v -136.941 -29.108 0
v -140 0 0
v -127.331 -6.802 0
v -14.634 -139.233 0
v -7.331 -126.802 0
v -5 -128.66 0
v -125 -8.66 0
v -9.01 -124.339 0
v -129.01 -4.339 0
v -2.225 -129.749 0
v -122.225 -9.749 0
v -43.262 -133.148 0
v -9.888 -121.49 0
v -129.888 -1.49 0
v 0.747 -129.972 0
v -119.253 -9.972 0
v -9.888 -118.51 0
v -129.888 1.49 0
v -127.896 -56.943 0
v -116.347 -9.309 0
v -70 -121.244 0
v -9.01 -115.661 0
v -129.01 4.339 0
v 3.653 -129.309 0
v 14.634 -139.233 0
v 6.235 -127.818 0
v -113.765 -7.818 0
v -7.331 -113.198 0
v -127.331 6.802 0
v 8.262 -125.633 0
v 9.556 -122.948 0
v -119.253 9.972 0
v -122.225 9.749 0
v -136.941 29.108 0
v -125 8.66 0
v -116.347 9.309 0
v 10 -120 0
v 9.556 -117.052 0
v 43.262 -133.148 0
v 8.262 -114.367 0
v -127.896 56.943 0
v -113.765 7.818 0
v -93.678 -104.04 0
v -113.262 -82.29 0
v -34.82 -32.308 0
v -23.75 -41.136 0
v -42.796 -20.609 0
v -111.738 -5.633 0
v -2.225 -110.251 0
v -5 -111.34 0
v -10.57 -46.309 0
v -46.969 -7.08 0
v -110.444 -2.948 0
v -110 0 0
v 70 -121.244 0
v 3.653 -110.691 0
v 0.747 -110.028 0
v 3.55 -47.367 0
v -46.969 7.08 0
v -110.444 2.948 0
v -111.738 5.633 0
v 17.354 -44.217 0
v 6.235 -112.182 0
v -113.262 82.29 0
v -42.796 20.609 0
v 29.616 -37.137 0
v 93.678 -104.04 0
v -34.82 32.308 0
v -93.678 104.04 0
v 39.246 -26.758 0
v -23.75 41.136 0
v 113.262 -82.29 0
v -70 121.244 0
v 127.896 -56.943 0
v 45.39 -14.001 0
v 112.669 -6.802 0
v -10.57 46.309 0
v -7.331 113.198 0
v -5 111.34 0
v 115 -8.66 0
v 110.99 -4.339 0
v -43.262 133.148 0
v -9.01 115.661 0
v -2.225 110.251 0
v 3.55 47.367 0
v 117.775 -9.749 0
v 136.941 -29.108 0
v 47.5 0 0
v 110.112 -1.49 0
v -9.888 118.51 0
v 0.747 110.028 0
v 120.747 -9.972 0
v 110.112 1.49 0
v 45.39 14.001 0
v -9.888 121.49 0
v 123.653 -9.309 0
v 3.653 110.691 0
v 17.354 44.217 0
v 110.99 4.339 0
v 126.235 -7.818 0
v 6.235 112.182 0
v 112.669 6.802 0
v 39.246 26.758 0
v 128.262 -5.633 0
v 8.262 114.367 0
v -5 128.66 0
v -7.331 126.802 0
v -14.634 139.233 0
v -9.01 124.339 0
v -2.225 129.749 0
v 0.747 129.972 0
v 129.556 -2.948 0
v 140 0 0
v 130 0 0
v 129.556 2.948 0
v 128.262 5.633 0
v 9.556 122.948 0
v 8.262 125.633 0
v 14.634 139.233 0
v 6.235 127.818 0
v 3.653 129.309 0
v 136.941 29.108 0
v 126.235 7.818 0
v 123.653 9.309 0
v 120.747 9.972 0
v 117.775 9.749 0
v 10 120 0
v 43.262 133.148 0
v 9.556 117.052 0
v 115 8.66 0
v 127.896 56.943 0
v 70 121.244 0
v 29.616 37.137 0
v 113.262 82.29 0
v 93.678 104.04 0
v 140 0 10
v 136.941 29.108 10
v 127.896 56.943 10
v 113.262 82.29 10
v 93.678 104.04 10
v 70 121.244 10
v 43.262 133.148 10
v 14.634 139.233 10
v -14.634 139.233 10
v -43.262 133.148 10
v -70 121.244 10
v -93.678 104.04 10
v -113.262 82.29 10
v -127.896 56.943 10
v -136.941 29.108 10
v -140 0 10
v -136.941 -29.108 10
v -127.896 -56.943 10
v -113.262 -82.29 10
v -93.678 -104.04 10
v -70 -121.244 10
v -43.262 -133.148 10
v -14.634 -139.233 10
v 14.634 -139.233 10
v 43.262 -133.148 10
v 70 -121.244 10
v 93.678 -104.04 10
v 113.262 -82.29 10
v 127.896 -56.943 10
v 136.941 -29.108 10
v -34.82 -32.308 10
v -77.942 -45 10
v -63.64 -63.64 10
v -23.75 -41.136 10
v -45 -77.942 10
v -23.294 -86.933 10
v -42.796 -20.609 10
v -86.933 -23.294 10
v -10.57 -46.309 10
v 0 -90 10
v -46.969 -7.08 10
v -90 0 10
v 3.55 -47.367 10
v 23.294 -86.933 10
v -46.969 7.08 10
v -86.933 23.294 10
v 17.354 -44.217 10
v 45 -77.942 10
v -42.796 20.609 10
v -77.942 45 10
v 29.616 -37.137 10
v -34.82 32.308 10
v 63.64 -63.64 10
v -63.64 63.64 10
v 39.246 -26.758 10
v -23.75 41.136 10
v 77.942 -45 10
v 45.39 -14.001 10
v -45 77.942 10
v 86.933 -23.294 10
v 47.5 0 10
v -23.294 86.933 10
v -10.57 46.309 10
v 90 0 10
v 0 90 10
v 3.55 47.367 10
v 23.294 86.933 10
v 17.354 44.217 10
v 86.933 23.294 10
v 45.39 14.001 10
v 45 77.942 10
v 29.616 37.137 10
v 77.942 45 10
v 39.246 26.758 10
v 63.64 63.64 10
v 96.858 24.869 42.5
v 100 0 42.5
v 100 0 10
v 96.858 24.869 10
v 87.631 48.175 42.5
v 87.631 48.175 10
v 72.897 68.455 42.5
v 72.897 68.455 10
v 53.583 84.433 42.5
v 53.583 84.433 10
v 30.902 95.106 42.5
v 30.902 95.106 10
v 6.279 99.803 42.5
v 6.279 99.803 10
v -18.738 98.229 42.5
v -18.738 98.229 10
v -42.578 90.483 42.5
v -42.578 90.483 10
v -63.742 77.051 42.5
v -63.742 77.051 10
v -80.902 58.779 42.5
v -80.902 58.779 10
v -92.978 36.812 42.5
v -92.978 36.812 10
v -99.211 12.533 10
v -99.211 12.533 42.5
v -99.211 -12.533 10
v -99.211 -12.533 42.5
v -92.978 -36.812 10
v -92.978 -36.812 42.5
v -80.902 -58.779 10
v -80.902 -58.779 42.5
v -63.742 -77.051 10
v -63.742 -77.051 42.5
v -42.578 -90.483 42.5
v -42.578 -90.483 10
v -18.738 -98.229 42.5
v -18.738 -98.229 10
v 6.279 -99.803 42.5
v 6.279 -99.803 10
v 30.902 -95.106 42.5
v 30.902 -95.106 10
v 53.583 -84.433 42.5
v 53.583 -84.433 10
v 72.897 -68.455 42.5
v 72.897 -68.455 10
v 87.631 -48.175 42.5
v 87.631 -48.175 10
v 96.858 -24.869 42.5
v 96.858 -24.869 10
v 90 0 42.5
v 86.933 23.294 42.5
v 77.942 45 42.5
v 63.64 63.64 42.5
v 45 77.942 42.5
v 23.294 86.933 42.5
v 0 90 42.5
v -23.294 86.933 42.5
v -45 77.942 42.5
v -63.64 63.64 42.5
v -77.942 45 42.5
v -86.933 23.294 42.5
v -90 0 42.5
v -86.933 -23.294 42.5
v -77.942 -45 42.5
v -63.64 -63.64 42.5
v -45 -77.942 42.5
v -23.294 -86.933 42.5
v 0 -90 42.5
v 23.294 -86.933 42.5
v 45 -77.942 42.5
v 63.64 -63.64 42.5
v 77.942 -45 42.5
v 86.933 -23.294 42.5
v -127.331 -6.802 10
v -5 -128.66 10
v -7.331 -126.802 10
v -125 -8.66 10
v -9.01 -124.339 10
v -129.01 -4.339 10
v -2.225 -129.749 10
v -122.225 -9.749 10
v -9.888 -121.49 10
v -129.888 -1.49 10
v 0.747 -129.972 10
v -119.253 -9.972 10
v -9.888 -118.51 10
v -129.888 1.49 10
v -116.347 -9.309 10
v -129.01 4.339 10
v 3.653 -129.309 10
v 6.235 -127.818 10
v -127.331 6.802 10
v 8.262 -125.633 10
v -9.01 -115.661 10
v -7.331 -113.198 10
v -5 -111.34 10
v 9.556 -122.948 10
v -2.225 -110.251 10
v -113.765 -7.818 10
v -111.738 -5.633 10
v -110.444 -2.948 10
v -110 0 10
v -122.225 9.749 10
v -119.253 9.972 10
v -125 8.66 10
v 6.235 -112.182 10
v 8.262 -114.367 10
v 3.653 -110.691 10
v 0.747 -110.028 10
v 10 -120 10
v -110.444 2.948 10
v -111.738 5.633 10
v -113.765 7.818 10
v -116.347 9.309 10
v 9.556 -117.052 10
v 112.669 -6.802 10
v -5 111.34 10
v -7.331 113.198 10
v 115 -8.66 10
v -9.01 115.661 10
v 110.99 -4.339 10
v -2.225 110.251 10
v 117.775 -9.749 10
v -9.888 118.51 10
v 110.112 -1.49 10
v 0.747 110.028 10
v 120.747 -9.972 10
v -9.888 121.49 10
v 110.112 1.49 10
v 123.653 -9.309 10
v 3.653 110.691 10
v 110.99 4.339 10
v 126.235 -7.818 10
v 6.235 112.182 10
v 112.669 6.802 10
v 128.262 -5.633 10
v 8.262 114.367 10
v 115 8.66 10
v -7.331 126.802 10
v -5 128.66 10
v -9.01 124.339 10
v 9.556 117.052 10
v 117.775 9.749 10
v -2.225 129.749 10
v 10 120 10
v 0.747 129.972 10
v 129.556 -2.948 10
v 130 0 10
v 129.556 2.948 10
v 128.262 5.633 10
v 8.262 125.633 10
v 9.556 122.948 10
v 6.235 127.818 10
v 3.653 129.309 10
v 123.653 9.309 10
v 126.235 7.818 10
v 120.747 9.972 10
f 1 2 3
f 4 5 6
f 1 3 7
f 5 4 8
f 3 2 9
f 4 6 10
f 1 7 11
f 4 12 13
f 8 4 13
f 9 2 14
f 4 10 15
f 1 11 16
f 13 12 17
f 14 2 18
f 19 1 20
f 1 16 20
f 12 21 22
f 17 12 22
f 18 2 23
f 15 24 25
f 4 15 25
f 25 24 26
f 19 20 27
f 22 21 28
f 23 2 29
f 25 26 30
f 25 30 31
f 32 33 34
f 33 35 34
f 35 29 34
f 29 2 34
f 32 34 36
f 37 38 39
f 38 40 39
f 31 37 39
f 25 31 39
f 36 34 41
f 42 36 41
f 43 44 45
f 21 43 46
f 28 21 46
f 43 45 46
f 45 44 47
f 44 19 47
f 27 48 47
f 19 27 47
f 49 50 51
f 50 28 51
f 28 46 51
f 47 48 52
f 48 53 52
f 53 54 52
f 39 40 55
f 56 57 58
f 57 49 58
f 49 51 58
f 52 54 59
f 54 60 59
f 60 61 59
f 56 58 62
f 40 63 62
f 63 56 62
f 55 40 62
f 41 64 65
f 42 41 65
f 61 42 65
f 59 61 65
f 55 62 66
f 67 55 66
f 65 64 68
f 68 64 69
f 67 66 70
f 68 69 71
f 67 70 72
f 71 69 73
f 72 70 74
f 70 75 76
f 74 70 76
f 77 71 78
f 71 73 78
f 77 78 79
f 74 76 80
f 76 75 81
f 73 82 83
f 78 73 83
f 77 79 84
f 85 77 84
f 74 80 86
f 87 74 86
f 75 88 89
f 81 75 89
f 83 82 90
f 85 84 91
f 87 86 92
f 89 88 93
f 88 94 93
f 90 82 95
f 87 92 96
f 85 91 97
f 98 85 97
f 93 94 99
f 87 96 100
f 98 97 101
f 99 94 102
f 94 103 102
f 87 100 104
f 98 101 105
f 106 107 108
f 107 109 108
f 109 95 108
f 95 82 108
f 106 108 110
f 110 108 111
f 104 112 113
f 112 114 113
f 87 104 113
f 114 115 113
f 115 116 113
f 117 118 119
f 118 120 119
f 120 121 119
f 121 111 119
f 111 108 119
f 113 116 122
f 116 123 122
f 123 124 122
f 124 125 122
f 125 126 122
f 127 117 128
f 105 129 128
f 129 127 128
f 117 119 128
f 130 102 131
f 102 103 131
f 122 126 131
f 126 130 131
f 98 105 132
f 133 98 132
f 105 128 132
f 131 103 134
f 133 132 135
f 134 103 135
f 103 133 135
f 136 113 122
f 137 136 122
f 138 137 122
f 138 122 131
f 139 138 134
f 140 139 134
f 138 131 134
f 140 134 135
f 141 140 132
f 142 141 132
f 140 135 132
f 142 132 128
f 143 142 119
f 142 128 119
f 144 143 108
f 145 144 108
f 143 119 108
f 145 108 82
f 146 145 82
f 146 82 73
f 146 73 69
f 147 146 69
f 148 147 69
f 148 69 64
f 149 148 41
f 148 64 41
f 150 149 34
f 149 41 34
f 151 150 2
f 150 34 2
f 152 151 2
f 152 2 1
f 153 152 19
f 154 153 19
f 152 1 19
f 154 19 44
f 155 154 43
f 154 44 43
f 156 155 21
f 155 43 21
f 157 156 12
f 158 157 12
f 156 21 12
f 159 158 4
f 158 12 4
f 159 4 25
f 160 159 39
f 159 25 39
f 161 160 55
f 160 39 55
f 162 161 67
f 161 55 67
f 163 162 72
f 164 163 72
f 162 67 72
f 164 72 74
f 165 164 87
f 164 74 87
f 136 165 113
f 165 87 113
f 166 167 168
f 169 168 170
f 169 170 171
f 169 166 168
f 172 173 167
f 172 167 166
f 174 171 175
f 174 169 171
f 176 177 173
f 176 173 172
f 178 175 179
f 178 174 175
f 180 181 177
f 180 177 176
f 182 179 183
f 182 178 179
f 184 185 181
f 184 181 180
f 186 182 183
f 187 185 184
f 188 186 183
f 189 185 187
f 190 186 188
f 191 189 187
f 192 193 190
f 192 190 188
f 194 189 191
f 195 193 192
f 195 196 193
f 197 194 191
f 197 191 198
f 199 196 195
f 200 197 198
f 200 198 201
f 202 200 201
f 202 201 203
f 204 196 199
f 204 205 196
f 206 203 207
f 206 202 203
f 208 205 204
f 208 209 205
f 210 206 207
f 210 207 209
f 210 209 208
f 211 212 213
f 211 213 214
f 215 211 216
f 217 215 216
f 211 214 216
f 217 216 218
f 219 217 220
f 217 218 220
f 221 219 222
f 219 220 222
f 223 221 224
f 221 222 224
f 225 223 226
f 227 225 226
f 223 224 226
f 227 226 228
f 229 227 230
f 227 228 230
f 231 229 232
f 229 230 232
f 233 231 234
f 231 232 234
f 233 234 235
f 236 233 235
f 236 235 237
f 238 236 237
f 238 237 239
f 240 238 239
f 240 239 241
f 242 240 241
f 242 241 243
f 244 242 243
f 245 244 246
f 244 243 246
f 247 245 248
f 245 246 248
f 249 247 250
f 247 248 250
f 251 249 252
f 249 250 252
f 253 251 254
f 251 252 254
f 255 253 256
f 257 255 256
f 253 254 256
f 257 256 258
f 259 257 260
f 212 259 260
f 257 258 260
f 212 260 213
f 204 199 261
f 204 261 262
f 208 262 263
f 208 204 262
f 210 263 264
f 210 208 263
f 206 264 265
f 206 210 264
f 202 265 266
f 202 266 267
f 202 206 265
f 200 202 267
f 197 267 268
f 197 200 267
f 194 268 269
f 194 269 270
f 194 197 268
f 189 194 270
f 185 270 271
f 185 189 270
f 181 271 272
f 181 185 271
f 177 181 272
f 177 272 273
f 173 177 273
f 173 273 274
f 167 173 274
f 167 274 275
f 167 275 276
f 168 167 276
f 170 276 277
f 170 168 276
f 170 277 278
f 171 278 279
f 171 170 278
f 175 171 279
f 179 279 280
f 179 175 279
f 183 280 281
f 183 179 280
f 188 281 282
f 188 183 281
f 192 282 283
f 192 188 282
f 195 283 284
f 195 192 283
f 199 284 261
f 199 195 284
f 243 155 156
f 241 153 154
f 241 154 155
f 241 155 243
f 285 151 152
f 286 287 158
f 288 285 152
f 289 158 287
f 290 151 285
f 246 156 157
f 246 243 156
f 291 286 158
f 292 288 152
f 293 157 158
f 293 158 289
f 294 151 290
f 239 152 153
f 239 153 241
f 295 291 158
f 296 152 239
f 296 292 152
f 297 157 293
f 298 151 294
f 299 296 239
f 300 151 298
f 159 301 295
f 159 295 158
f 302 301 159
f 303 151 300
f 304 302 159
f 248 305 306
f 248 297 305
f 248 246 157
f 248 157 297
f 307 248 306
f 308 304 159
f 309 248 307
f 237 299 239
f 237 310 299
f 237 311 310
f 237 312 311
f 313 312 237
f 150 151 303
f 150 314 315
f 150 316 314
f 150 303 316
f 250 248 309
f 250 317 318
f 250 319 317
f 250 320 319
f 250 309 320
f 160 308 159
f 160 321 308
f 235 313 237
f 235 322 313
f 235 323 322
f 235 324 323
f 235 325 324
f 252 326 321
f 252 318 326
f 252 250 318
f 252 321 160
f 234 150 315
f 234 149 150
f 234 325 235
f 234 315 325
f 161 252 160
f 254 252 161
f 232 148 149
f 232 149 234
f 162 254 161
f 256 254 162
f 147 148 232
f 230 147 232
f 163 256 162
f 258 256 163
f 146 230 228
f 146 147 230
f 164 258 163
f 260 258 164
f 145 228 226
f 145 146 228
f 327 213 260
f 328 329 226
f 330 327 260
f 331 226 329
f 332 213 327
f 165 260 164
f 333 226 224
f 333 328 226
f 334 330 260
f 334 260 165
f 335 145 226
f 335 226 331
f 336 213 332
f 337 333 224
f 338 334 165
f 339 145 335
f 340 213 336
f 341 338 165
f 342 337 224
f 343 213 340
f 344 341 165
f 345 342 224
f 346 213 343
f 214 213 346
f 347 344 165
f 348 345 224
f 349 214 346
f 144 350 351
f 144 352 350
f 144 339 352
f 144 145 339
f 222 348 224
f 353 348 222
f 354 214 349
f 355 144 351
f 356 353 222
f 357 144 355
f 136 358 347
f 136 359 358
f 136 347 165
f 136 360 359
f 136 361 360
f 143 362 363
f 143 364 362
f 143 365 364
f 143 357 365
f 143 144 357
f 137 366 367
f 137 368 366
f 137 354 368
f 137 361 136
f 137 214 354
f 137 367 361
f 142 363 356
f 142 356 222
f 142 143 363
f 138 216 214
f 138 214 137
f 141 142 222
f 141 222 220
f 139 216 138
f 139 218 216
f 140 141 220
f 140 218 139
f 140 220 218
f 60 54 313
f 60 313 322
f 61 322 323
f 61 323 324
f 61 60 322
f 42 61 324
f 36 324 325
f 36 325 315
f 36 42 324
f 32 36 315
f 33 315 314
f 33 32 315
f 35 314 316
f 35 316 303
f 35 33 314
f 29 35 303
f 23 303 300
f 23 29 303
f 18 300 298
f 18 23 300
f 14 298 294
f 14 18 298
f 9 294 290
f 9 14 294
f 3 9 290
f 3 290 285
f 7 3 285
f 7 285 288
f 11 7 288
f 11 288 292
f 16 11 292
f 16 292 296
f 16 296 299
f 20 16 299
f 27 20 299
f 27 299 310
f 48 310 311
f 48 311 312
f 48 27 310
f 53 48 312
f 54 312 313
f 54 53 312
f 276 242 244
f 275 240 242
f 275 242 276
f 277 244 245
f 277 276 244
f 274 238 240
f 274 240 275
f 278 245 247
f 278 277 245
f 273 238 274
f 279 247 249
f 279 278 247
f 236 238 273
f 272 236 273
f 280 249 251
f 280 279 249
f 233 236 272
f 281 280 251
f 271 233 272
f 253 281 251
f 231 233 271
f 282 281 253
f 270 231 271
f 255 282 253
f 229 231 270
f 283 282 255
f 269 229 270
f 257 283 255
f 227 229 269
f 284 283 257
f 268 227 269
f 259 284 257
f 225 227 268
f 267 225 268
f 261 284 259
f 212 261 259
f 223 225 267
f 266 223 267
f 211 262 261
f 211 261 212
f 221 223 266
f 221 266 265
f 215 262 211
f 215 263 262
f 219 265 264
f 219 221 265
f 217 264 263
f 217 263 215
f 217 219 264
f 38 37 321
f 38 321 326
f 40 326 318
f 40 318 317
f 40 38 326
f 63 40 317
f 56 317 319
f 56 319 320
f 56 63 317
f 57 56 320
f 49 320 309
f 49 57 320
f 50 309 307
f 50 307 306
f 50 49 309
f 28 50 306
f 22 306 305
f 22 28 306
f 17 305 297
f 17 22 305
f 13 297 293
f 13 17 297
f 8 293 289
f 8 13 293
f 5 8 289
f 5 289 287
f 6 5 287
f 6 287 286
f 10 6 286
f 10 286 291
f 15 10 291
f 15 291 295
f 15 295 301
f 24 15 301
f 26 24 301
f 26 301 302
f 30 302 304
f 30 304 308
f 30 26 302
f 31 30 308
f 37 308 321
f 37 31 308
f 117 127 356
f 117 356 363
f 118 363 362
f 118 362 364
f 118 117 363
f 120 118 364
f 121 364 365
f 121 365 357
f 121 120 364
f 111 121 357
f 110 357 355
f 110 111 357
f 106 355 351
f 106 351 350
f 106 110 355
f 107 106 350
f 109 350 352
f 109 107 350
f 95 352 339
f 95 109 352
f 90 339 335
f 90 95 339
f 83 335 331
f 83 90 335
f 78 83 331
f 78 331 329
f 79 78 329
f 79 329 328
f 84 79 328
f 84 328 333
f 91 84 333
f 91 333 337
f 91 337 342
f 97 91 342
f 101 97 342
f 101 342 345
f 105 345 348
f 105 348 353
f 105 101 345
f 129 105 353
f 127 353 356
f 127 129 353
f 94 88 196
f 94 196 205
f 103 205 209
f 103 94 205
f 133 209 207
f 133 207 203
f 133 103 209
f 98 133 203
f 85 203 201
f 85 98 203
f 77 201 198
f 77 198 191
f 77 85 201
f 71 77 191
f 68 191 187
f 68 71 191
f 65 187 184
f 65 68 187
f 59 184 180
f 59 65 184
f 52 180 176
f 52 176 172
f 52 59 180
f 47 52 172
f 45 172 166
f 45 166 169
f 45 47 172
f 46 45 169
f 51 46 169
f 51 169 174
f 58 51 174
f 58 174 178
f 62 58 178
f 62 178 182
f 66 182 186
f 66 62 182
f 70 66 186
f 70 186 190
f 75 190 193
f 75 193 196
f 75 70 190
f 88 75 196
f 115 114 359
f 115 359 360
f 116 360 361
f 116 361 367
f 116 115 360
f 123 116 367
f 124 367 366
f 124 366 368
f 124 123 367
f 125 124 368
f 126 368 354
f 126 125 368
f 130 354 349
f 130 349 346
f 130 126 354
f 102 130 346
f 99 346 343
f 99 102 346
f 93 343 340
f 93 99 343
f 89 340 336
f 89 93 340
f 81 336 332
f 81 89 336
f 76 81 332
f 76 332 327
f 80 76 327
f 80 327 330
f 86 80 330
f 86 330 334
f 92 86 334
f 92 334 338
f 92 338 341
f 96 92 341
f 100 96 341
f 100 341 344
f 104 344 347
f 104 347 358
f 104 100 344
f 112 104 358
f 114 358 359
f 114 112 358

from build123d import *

# Parameters (mm, degrees)
SKETCH_1_R      = 140
SKETCH_1_R_2    = 47.5
SKETCH_1_R_3    = 10
EXTRUDE_1_DEPTH = 10
SKETCH_2_R      = 100
SKETCH_2_R_2    = 90
EXTRUDE_2_DEPTH = 32.5


with BuildPart() as part:
    # 草图1 → 拉伸1 (new body)
    with BuildSketch(Plane.XY):
        Circle(SKETCH_1_R)
        Circle(SKETCH_1_R_2, mode=Mode.SUBTRACT)
        with Locations((0, 120)):
            Circle(SKETCH_1_R_3, mode=Mode.SUBTRACT)
        with Locations((120, 0)):
            Circle(SKETCH_1_R_3, mode=Mode.SUBTRACT)
        with Locations((0, -120)):
            Circle(SKETCH_1_R_3, mode=Mode.SUBTRACT)
        with Locations((-120, 0)):
            Circle(SKETCH_1_R_3, mode=Mode.SUBTRACT)
    extrude(amount=EXTRUDE_1_DEPTH)

    # 草图2 → 拉伸2 (add)
    with BuildSketch(Plane.XY.offset(10)):
        Circle(SKETCH_2_R)
        Circle(SKETCH_2_R_2, mode=Mode.SUBTRACT)
    extrude(amount=EXTRUDE_2_DEPTH)


solid = part.part
